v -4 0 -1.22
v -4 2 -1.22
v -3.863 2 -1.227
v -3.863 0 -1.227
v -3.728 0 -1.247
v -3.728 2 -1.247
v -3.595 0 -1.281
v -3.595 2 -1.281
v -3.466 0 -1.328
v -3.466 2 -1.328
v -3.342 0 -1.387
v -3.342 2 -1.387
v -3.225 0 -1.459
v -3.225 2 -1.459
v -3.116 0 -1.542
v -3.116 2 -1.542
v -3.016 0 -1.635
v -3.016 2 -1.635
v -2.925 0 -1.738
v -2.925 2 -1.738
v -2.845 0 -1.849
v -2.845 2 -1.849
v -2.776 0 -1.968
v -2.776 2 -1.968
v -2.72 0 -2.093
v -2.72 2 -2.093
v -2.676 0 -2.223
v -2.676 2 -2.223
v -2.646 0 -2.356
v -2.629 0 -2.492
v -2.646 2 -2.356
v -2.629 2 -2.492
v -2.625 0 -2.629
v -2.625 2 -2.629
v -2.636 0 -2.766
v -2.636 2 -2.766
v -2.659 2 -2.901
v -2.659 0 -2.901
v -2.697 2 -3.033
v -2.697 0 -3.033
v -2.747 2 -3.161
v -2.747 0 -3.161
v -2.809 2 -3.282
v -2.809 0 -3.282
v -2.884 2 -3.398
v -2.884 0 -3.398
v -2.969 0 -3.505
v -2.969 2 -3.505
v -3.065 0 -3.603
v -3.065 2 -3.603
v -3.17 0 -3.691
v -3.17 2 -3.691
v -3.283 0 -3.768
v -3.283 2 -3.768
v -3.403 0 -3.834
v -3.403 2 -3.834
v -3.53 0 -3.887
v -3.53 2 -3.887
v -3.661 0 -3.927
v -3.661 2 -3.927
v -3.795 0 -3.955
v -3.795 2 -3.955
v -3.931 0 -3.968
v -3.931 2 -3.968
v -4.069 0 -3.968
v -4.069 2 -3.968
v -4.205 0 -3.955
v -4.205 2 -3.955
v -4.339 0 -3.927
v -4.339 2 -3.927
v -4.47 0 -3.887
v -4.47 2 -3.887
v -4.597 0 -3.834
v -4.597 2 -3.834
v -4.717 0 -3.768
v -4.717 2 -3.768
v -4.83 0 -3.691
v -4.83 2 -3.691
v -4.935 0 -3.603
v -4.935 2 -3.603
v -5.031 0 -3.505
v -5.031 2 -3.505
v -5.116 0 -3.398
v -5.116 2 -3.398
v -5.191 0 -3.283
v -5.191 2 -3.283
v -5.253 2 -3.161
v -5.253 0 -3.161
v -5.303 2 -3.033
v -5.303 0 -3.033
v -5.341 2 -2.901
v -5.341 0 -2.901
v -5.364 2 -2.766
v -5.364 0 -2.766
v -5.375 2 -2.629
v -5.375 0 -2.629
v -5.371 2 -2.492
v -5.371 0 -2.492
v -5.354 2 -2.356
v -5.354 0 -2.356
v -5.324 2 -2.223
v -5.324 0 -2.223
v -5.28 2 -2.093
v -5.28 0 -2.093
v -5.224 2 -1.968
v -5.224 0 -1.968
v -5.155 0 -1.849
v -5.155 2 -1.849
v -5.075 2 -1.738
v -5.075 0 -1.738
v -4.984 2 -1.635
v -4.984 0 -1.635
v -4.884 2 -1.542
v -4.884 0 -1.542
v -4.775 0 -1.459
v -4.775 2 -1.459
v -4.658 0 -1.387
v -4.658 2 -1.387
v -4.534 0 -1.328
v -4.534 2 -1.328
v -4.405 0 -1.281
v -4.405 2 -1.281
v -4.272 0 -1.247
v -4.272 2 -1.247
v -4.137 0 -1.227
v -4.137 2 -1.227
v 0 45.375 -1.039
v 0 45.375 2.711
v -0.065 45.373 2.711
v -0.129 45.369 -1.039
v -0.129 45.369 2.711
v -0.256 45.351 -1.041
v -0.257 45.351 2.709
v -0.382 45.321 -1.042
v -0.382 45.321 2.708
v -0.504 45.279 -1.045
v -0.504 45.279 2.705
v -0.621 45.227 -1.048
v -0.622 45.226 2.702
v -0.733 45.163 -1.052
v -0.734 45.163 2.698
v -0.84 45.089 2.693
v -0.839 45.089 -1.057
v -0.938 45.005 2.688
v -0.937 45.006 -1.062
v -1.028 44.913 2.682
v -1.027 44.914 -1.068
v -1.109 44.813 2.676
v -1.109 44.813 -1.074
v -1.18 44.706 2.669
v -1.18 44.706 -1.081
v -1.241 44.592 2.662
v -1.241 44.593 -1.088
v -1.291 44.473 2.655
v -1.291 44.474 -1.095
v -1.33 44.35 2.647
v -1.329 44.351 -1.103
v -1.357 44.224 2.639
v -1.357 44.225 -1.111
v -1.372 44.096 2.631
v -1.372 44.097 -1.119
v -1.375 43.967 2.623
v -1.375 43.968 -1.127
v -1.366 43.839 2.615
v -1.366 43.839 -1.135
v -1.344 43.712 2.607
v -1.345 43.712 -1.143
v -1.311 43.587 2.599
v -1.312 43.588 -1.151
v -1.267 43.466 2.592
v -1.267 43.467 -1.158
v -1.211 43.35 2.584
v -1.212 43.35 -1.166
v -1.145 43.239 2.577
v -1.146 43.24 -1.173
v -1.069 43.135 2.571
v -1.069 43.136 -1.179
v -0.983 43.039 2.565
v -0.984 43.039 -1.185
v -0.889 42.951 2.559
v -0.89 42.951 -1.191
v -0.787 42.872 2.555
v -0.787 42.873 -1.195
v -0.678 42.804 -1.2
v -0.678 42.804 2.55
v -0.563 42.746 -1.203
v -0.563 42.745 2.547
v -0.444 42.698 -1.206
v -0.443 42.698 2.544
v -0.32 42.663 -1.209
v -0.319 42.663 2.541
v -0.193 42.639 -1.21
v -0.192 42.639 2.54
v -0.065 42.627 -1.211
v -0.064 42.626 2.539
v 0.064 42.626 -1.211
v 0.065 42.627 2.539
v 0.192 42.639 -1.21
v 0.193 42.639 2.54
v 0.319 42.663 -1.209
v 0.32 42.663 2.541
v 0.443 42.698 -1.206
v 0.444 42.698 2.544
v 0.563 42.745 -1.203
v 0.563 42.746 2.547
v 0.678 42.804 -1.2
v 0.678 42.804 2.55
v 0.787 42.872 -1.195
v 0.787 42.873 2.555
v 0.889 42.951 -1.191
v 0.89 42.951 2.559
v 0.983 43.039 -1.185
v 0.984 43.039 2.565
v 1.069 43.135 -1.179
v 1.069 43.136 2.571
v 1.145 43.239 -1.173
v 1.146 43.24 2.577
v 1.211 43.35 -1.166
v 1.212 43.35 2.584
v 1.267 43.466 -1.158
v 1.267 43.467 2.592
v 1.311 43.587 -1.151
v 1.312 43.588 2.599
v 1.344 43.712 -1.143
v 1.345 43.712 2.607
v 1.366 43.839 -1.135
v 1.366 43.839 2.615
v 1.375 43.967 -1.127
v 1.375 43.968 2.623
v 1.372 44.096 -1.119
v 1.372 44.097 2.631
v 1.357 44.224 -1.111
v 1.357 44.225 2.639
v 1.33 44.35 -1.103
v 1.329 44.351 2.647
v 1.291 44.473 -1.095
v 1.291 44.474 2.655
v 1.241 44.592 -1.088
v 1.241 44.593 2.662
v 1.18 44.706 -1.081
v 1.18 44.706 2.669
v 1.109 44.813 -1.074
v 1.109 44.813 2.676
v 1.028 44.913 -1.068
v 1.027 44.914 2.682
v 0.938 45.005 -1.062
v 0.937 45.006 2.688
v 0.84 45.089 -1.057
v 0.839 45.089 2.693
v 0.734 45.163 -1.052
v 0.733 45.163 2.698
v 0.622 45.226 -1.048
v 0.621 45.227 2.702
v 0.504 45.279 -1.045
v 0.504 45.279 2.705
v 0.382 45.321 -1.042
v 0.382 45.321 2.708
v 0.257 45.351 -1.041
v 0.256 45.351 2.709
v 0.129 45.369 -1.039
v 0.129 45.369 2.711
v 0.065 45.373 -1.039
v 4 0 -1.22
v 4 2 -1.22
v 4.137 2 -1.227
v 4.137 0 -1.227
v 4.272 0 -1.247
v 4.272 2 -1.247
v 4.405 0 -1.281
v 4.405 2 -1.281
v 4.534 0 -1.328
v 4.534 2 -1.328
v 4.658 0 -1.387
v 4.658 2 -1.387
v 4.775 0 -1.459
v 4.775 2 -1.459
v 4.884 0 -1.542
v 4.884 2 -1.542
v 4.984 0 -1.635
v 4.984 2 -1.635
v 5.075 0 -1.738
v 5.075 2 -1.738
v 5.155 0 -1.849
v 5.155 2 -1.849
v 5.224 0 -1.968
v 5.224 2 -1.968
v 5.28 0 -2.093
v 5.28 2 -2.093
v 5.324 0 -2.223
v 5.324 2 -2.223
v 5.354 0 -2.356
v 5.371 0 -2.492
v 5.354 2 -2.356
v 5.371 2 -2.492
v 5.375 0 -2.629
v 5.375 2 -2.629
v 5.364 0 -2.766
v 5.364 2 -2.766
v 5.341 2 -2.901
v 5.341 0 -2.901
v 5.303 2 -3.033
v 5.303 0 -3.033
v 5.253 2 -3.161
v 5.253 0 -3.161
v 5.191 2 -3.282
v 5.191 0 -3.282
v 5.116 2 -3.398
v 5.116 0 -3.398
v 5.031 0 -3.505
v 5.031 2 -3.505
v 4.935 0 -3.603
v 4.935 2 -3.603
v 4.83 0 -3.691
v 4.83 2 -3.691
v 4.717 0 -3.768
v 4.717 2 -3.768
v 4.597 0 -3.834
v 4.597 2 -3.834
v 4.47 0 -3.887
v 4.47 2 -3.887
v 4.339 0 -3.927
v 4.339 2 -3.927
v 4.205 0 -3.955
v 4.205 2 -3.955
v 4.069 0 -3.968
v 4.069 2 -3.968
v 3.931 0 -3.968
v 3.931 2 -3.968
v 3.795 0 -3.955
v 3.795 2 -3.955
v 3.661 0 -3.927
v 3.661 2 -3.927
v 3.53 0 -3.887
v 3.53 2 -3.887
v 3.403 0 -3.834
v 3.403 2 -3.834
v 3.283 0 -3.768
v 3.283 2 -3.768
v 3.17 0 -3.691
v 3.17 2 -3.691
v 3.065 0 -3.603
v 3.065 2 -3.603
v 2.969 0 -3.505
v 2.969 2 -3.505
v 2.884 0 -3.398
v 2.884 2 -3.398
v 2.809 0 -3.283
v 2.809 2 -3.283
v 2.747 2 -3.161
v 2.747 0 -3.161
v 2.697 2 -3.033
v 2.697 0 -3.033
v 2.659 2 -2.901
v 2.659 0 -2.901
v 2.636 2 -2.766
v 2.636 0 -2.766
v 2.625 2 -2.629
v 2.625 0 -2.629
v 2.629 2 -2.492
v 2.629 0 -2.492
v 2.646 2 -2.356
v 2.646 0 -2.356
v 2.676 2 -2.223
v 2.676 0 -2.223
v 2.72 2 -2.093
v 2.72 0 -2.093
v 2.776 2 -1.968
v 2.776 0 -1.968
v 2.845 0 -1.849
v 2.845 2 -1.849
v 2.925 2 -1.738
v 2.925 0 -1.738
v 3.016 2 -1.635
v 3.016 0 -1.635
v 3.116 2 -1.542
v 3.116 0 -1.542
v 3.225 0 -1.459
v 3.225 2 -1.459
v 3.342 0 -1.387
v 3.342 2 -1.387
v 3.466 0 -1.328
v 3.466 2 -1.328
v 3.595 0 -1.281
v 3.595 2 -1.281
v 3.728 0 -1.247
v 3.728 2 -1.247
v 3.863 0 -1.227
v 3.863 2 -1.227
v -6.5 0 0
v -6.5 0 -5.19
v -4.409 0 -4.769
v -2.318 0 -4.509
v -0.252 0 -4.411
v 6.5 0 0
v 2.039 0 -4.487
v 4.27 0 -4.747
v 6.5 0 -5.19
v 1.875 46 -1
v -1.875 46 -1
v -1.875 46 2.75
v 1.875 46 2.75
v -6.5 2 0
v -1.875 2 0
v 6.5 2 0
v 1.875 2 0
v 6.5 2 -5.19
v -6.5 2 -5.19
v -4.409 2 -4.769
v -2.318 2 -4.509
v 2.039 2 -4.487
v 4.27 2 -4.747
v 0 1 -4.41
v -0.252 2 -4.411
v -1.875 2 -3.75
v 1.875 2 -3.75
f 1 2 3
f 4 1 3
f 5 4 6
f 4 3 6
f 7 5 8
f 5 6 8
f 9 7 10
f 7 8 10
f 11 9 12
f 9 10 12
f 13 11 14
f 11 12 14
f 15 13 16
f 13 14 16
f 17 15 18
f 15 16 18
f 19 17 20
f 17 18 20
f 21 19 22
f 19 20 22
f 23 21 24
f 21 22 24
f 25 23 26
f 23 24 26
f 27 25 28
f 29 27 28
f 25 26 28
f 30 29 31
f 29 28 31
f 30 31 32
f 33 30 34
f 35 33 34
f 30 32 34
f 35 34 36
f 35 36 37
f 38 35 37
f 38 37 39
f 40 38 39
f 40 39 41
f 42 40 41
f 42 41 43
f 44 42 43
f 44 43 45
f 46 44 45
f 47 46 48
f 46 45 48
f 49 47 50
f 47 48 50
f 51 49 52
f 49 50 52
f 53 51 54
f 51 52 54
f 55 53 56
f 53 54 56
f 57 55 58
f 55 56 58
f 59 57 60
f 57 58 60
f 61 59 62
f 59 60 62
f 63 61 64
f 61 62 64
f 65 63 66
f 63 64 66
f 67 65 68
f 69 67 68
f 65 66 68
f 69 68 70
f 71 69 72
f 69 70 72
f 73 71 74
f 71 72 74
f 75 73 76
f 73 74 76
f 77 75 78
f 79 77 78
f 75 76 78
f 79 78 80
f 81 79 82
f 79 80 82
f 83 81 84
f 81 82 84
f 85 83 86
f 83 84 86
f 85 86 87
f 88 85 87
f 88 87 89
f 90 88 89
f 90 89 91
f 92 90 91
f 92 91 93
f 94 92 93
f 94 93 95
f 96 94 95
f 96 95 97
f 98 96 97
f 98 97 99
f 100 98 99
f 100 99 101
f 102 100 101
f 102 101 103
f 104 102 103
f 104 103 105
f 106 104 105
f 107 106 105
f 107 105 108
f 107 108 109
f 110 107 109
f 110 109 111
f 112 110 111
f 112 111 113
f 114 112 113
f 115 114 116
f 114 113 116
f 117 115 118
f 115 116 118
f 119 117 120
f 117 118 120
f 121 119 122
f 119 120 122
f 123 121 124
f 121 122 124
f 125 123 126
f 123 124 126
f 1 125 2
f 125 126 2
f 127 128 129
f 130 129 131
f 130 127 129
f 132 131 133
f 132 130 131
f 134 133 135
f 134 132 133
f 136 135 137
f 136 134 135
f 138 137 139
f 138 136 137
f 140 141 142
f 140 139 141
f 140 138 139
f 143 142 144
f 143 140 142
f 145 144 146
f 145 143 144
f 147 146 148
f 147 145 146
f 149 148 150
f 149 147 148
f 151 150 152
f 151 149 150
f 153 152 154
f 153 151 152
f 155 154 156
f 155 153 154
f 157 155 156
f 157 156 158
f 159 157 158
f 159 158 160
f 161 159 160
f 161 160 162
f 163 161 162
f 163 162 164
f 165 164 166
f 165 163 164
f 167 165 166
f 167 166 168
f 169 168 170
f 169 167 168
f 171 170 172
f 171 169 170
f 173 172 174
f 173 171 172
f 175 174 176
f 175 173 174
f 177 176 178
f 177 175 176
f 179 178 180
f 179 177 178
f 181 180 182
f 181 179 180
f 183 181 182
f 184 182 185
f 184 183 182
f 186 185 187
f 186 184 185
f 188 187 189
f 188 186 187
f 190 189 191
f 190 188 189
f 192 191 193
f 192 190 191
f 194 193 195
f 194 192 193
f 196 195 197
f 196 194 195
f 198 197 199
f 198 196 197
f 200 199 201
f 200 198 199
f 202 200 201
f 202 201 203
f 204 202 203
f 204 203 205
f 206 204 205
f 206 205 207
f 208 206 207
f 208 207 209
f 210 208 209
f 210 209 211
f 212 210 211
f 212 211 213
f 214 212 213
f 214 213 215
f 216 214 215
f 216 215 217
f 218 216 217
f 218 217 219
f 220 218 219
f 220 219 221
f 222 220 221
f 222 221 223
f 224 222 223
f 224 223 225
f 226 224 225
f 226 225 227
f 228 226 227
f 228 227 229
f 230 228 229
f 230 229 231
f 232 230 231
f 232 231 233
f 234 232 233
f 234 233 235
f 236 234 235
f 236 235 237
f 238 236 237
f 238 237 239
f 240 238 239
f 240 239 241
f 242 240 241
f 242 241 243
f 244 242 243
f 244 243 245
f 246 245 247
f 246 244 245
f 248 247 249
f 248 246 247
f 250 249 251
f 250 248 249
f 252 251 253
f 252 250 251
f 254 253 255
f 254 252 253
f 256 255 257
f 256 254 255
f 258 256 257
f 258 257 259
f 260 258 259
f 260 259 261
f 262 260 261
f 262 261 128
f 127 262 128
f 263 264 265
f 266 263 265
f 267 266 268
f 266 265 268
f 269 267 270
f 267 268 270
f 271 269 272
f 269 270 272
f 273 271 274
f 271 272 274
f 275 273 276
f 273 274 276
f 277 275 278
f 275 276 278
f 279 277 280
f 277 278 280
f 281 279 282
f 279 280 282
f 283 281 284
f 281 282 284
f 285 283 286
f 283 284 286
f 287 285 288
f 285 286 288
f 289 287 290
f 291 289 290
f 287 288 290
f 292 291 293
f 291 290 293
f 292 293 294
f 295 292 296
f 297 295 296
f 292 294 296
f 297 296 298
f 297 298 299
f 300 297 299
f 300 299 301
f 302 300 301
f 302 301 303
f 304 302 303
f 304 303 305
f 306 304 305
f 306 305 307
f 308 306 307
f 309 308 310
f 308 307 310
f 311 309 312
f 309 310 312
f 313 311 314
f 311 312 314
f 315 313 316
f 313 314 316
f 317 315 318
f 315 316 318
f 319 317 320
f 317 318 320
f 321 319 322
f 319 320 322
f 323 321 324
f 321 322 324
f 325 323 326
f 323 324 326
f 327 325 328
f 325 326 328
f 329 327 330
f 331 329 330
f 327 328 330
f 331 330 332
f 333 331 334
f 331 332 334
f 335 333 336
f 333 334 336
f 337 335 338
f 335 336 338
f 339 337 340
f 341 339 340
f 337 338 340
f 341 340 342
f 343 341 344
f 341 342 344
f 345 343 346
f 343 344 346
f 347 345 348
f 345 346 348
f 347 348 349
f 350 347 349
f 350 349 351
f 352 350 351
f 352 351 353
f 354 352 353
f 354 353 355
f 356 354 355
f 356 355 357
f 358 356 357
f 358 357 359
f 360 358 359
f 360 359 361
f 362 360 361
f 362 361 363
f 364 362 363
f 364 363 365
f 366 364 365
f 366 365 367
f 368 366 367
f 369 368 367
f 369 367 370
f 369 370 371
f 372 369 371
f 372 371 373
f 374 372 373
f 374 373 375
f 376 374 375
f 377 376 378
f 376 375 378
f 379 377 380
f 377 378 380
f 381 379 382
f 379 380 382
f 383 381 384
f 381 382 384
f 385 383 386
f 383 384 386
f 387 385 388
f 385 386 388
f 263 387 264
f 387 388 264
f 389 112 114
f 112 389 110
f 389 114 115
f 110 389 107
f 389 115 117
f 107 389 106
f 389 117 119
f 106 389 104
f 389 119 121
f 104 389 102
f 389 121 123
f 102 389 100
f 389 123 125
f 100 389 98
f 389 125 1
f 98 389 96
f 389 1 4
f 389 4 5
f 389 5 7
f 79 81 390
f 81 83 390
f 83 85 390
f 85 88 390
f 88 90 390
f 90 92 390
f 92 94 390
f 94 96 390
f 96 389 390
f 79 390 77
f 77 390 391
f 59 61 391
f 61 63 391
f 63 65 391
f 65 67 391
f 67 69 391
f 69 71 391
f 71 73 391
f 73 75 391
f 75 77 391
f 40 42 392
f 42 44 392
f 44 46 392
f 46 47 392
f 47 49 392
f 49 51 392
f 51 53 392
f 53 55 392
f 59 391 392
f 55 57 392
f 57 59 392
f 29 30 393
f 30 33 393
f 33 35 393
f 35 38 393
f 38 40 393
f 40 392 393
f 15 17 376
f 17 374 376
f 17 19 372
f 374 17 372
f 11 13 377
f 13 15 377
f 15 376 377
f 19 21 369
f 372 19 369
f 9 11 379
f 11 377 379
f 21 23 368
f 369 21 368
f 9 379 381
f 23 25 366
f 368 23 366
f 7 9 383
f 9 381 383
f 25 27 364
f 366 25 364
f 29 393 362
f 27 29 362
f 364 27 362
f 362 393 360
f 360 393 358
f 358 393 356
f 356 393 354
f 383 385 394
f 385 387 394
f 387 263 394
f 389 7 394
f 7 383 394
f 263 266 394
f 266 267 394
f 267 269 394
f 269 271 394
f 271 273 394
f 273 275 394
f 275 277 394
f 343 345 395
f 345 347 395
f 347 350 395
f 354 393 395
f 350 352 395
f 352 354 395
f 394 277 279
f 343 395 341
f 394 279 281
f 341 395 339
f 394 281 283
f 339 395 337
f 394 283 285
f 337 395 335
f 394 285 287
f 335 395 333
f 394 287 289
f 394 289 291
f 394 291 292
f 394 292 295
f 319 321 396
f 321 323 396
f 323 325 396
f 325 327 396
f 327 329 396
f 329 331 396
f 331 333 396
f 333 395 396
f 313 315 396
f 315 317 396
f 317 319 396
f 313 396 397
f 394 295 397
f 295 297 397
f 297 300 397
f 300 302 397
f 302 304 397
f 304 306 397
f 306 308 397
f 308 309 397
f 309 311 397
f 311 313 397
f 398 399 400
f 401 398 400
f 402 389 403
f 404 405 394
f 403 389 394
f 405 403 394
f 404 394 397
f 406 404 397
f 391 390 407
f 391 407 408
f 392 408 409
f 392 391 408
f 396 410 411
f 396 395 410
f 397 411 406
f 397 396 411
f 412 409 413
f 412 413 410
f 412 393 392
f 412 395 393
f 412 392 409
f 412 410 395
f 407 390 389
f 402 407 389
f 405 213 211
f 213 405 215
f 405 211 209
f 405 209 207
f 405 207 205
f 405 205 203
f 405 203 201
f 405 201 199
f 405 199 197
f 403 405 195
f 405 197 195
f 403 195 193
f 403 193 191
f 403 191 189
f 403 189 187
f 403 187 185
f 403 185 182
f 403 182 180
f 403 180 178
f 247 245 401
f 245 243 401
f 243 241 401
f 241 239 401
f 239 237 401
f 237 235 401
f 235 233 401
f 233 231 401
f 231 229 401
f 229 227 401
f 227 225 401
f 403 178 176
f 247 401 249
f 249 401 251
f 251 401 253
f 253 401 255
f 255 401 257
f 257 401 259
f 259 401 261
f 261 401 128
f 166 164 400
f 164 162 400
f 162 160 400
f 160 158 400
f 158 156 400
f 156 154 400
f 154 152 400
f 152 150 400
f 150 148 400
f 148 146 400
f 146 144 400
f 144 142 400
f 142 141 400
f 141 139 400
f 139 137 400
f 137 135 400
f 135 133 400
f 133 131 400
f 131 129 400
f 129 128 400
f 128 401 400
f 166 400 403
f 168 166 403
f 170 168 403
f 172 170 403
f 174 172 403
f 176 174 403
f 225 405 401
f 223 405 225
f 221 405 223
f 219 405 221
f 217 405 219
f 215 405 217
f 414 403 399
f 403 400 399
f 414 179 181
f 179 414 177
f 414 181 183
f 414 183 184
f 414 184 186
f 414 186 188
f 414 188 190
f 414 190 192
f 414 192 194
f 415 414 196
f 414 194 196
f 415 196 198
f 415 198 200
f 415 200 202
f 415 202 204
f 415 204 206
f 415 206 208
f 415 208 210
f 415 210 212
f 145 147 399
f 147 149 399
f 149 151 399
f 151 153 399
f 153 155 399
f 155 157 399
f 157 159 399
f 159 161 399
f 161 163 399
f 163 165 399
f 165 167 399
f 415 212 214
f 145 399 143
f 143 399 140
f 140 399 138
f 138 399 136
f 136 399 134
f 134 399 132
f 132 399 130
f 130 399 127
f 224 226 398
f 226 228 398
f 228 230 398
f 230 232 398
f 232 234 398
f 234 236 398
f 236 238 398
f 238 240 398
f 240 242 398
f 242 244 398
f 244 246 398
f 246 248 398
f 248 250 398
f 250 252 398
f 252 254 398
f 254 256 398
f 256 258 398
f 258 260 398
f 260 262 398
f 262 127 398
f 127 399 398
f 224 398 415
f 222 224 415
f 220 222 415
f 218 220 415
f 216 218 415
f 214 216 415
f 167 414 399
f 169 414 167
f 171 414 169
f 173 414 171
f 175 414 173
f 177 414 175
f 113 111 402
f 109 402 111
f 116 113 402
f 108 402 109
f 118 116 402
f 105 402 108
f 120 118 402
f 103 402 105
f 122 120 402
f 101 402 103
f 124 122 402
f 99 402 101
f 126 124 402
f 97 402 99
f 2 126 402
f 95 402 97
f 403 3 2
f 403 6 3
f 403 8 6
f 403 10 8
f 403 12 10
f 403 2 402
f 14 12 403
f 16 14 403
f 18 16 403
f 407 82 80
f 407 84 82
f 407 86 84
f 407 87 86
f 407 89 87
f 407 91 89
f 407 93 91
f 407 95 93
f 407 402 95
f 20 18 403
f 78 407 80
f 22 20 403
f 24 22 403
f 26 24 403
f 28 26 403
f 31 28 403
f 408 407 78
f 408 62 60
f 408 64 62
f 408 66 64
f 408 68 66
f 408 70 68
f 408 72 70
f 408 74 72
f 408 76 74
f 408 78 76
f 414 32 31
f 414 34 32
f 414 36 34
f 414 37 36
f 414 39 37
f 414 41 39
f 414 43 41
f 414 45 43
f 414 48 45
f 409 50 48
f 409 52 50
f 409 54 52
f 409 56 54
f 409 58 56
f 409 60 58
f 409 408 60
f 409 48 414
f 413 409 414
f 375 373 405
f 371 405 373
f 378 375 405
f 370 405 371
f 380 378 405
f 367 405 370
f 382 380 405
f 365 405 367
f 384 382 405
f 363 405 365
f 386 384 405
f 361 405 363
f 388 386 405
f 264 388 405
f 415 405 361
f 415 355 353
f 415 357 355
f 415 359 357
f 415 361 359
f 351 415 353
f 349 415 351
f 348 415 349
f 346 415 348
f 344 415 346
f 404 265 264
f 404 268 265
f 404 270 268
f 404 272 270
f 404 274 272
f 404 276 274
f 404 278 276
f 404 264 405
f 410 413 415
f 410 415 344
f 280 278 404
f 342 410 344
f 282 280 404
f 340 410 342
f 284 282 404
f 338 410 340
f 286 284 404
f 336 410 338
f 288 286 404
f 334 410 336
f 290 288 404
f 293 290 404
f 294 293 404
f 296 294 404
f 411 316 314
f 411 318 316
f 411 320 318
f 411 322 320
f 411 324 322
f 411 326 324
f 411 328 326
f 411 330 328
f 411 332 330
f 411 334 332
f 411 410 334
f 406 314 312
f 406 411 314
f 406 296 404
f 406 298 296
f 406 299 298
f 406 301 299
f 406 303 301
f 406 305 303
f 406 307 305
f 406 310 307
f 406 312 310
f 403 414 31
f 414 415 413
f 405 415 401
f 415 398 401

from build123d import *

# Parameters (mm, degrees)
BOSS_EXTRUDE1_DEPTH     = 2
SKETCH2_R               = 1.375
CUT_EXTRUDE1_DEPTH      = 2
CUT_EXTRUDE3_DEPTH      = 47.745974282
CUT_EXTRUDE3_DEPTH_BACK = 47.745974282
SKETCH12_R              = 1.375


with BuildPart() as part:
    # Sketch1 → Boss-Extrude1 (new body)
    with BuildSketch(Plane(origin=(0, 0, 0), x_dir=(1, 0, 0), z_dir=(0, 1, 0))):
        with BuildLine():
            Line((-6.5, 0), (6.5, 0))
            Line((6.5, 0), (6.5, 5.19))
            add(Edge.make_bspline(
                [(-6.5, 5.19), (0, 3.63), (6.5, 5.19)],
                knots=[0, 0, 0, 1, 1, 1], degree=2))
            Line((-6.5, 5.19), (-6.5, 0))
        make_face()
    extrude(amount=BOSS_EXTRUDE1_DEPTH)

    # Sketch2 → Cut-Extrude1 (cut)
    with BuildSketch(Plane(origin=(0, 2, 0), x_dir=(1, 0, 0), z_dir=(0, 1, 0))):
        with Locations(Location((-4, 2.595, 0), (0, 0, 270))):
            Circle(SKETCH2_R)
        with Locations(Location((4, 2.595, 0), (0, 0, 270))):
            Circle(SKETCH2_R)
    extrude(amount=-CUT_EXTRUDE1_DEPTH, mode=Mode.SUBTRACT)

    # Sketch4 → Loft2 section 0
    with BuildSketch(Plane(origin=(0, 2, 0), x_dir=(1, 0, 0), z_dir=(0, 1, 0))):
        with BuildLine():
            Line((-1.875, 3.75), (1.875, 3.75))
            Line((1.875, 3.75), (1.875, 0))
            Line((1.875, 0), (-1.875, 0))
            Line((-1.875, 0), (-1.875, 3.75))
        make_face()
    # Sketch6 → Loft2 section 1
    with BuildSketch(Plane(origin=(0, 46, 0), x_dir=(1, 0, 0), z_dir=(0, 1, 0))):
        with BuildLine():
            Line((-1.875, 1), (1.875, 1))
            Line((1.875, 1), (1.875, -2.75))
            Line((1.875, -2.75), (-1.875, -2.75))
            Line((-1.875, -2.75), (-1.875, 1))
        make_face()
    loft()

    # Sketch12 → Cut-Extrude3 (cut, two sides: drawn at the far end of the back side and taken through both)
    with BuildSketch(Plane.XY.offset(-CUT_EXTRUDE3_DEPTH_BACK)):
        with Locations(Location((0, 44, 0), (0, 0, 90))):
            Circle(SKETCH12_R)
    extrude(amount=CUT_EXTRUDE3_DEPTH + CUT_EXTRUDE3_DEPTH_BACK, mode=Mode.SUBTRACT)


solid = part.part
